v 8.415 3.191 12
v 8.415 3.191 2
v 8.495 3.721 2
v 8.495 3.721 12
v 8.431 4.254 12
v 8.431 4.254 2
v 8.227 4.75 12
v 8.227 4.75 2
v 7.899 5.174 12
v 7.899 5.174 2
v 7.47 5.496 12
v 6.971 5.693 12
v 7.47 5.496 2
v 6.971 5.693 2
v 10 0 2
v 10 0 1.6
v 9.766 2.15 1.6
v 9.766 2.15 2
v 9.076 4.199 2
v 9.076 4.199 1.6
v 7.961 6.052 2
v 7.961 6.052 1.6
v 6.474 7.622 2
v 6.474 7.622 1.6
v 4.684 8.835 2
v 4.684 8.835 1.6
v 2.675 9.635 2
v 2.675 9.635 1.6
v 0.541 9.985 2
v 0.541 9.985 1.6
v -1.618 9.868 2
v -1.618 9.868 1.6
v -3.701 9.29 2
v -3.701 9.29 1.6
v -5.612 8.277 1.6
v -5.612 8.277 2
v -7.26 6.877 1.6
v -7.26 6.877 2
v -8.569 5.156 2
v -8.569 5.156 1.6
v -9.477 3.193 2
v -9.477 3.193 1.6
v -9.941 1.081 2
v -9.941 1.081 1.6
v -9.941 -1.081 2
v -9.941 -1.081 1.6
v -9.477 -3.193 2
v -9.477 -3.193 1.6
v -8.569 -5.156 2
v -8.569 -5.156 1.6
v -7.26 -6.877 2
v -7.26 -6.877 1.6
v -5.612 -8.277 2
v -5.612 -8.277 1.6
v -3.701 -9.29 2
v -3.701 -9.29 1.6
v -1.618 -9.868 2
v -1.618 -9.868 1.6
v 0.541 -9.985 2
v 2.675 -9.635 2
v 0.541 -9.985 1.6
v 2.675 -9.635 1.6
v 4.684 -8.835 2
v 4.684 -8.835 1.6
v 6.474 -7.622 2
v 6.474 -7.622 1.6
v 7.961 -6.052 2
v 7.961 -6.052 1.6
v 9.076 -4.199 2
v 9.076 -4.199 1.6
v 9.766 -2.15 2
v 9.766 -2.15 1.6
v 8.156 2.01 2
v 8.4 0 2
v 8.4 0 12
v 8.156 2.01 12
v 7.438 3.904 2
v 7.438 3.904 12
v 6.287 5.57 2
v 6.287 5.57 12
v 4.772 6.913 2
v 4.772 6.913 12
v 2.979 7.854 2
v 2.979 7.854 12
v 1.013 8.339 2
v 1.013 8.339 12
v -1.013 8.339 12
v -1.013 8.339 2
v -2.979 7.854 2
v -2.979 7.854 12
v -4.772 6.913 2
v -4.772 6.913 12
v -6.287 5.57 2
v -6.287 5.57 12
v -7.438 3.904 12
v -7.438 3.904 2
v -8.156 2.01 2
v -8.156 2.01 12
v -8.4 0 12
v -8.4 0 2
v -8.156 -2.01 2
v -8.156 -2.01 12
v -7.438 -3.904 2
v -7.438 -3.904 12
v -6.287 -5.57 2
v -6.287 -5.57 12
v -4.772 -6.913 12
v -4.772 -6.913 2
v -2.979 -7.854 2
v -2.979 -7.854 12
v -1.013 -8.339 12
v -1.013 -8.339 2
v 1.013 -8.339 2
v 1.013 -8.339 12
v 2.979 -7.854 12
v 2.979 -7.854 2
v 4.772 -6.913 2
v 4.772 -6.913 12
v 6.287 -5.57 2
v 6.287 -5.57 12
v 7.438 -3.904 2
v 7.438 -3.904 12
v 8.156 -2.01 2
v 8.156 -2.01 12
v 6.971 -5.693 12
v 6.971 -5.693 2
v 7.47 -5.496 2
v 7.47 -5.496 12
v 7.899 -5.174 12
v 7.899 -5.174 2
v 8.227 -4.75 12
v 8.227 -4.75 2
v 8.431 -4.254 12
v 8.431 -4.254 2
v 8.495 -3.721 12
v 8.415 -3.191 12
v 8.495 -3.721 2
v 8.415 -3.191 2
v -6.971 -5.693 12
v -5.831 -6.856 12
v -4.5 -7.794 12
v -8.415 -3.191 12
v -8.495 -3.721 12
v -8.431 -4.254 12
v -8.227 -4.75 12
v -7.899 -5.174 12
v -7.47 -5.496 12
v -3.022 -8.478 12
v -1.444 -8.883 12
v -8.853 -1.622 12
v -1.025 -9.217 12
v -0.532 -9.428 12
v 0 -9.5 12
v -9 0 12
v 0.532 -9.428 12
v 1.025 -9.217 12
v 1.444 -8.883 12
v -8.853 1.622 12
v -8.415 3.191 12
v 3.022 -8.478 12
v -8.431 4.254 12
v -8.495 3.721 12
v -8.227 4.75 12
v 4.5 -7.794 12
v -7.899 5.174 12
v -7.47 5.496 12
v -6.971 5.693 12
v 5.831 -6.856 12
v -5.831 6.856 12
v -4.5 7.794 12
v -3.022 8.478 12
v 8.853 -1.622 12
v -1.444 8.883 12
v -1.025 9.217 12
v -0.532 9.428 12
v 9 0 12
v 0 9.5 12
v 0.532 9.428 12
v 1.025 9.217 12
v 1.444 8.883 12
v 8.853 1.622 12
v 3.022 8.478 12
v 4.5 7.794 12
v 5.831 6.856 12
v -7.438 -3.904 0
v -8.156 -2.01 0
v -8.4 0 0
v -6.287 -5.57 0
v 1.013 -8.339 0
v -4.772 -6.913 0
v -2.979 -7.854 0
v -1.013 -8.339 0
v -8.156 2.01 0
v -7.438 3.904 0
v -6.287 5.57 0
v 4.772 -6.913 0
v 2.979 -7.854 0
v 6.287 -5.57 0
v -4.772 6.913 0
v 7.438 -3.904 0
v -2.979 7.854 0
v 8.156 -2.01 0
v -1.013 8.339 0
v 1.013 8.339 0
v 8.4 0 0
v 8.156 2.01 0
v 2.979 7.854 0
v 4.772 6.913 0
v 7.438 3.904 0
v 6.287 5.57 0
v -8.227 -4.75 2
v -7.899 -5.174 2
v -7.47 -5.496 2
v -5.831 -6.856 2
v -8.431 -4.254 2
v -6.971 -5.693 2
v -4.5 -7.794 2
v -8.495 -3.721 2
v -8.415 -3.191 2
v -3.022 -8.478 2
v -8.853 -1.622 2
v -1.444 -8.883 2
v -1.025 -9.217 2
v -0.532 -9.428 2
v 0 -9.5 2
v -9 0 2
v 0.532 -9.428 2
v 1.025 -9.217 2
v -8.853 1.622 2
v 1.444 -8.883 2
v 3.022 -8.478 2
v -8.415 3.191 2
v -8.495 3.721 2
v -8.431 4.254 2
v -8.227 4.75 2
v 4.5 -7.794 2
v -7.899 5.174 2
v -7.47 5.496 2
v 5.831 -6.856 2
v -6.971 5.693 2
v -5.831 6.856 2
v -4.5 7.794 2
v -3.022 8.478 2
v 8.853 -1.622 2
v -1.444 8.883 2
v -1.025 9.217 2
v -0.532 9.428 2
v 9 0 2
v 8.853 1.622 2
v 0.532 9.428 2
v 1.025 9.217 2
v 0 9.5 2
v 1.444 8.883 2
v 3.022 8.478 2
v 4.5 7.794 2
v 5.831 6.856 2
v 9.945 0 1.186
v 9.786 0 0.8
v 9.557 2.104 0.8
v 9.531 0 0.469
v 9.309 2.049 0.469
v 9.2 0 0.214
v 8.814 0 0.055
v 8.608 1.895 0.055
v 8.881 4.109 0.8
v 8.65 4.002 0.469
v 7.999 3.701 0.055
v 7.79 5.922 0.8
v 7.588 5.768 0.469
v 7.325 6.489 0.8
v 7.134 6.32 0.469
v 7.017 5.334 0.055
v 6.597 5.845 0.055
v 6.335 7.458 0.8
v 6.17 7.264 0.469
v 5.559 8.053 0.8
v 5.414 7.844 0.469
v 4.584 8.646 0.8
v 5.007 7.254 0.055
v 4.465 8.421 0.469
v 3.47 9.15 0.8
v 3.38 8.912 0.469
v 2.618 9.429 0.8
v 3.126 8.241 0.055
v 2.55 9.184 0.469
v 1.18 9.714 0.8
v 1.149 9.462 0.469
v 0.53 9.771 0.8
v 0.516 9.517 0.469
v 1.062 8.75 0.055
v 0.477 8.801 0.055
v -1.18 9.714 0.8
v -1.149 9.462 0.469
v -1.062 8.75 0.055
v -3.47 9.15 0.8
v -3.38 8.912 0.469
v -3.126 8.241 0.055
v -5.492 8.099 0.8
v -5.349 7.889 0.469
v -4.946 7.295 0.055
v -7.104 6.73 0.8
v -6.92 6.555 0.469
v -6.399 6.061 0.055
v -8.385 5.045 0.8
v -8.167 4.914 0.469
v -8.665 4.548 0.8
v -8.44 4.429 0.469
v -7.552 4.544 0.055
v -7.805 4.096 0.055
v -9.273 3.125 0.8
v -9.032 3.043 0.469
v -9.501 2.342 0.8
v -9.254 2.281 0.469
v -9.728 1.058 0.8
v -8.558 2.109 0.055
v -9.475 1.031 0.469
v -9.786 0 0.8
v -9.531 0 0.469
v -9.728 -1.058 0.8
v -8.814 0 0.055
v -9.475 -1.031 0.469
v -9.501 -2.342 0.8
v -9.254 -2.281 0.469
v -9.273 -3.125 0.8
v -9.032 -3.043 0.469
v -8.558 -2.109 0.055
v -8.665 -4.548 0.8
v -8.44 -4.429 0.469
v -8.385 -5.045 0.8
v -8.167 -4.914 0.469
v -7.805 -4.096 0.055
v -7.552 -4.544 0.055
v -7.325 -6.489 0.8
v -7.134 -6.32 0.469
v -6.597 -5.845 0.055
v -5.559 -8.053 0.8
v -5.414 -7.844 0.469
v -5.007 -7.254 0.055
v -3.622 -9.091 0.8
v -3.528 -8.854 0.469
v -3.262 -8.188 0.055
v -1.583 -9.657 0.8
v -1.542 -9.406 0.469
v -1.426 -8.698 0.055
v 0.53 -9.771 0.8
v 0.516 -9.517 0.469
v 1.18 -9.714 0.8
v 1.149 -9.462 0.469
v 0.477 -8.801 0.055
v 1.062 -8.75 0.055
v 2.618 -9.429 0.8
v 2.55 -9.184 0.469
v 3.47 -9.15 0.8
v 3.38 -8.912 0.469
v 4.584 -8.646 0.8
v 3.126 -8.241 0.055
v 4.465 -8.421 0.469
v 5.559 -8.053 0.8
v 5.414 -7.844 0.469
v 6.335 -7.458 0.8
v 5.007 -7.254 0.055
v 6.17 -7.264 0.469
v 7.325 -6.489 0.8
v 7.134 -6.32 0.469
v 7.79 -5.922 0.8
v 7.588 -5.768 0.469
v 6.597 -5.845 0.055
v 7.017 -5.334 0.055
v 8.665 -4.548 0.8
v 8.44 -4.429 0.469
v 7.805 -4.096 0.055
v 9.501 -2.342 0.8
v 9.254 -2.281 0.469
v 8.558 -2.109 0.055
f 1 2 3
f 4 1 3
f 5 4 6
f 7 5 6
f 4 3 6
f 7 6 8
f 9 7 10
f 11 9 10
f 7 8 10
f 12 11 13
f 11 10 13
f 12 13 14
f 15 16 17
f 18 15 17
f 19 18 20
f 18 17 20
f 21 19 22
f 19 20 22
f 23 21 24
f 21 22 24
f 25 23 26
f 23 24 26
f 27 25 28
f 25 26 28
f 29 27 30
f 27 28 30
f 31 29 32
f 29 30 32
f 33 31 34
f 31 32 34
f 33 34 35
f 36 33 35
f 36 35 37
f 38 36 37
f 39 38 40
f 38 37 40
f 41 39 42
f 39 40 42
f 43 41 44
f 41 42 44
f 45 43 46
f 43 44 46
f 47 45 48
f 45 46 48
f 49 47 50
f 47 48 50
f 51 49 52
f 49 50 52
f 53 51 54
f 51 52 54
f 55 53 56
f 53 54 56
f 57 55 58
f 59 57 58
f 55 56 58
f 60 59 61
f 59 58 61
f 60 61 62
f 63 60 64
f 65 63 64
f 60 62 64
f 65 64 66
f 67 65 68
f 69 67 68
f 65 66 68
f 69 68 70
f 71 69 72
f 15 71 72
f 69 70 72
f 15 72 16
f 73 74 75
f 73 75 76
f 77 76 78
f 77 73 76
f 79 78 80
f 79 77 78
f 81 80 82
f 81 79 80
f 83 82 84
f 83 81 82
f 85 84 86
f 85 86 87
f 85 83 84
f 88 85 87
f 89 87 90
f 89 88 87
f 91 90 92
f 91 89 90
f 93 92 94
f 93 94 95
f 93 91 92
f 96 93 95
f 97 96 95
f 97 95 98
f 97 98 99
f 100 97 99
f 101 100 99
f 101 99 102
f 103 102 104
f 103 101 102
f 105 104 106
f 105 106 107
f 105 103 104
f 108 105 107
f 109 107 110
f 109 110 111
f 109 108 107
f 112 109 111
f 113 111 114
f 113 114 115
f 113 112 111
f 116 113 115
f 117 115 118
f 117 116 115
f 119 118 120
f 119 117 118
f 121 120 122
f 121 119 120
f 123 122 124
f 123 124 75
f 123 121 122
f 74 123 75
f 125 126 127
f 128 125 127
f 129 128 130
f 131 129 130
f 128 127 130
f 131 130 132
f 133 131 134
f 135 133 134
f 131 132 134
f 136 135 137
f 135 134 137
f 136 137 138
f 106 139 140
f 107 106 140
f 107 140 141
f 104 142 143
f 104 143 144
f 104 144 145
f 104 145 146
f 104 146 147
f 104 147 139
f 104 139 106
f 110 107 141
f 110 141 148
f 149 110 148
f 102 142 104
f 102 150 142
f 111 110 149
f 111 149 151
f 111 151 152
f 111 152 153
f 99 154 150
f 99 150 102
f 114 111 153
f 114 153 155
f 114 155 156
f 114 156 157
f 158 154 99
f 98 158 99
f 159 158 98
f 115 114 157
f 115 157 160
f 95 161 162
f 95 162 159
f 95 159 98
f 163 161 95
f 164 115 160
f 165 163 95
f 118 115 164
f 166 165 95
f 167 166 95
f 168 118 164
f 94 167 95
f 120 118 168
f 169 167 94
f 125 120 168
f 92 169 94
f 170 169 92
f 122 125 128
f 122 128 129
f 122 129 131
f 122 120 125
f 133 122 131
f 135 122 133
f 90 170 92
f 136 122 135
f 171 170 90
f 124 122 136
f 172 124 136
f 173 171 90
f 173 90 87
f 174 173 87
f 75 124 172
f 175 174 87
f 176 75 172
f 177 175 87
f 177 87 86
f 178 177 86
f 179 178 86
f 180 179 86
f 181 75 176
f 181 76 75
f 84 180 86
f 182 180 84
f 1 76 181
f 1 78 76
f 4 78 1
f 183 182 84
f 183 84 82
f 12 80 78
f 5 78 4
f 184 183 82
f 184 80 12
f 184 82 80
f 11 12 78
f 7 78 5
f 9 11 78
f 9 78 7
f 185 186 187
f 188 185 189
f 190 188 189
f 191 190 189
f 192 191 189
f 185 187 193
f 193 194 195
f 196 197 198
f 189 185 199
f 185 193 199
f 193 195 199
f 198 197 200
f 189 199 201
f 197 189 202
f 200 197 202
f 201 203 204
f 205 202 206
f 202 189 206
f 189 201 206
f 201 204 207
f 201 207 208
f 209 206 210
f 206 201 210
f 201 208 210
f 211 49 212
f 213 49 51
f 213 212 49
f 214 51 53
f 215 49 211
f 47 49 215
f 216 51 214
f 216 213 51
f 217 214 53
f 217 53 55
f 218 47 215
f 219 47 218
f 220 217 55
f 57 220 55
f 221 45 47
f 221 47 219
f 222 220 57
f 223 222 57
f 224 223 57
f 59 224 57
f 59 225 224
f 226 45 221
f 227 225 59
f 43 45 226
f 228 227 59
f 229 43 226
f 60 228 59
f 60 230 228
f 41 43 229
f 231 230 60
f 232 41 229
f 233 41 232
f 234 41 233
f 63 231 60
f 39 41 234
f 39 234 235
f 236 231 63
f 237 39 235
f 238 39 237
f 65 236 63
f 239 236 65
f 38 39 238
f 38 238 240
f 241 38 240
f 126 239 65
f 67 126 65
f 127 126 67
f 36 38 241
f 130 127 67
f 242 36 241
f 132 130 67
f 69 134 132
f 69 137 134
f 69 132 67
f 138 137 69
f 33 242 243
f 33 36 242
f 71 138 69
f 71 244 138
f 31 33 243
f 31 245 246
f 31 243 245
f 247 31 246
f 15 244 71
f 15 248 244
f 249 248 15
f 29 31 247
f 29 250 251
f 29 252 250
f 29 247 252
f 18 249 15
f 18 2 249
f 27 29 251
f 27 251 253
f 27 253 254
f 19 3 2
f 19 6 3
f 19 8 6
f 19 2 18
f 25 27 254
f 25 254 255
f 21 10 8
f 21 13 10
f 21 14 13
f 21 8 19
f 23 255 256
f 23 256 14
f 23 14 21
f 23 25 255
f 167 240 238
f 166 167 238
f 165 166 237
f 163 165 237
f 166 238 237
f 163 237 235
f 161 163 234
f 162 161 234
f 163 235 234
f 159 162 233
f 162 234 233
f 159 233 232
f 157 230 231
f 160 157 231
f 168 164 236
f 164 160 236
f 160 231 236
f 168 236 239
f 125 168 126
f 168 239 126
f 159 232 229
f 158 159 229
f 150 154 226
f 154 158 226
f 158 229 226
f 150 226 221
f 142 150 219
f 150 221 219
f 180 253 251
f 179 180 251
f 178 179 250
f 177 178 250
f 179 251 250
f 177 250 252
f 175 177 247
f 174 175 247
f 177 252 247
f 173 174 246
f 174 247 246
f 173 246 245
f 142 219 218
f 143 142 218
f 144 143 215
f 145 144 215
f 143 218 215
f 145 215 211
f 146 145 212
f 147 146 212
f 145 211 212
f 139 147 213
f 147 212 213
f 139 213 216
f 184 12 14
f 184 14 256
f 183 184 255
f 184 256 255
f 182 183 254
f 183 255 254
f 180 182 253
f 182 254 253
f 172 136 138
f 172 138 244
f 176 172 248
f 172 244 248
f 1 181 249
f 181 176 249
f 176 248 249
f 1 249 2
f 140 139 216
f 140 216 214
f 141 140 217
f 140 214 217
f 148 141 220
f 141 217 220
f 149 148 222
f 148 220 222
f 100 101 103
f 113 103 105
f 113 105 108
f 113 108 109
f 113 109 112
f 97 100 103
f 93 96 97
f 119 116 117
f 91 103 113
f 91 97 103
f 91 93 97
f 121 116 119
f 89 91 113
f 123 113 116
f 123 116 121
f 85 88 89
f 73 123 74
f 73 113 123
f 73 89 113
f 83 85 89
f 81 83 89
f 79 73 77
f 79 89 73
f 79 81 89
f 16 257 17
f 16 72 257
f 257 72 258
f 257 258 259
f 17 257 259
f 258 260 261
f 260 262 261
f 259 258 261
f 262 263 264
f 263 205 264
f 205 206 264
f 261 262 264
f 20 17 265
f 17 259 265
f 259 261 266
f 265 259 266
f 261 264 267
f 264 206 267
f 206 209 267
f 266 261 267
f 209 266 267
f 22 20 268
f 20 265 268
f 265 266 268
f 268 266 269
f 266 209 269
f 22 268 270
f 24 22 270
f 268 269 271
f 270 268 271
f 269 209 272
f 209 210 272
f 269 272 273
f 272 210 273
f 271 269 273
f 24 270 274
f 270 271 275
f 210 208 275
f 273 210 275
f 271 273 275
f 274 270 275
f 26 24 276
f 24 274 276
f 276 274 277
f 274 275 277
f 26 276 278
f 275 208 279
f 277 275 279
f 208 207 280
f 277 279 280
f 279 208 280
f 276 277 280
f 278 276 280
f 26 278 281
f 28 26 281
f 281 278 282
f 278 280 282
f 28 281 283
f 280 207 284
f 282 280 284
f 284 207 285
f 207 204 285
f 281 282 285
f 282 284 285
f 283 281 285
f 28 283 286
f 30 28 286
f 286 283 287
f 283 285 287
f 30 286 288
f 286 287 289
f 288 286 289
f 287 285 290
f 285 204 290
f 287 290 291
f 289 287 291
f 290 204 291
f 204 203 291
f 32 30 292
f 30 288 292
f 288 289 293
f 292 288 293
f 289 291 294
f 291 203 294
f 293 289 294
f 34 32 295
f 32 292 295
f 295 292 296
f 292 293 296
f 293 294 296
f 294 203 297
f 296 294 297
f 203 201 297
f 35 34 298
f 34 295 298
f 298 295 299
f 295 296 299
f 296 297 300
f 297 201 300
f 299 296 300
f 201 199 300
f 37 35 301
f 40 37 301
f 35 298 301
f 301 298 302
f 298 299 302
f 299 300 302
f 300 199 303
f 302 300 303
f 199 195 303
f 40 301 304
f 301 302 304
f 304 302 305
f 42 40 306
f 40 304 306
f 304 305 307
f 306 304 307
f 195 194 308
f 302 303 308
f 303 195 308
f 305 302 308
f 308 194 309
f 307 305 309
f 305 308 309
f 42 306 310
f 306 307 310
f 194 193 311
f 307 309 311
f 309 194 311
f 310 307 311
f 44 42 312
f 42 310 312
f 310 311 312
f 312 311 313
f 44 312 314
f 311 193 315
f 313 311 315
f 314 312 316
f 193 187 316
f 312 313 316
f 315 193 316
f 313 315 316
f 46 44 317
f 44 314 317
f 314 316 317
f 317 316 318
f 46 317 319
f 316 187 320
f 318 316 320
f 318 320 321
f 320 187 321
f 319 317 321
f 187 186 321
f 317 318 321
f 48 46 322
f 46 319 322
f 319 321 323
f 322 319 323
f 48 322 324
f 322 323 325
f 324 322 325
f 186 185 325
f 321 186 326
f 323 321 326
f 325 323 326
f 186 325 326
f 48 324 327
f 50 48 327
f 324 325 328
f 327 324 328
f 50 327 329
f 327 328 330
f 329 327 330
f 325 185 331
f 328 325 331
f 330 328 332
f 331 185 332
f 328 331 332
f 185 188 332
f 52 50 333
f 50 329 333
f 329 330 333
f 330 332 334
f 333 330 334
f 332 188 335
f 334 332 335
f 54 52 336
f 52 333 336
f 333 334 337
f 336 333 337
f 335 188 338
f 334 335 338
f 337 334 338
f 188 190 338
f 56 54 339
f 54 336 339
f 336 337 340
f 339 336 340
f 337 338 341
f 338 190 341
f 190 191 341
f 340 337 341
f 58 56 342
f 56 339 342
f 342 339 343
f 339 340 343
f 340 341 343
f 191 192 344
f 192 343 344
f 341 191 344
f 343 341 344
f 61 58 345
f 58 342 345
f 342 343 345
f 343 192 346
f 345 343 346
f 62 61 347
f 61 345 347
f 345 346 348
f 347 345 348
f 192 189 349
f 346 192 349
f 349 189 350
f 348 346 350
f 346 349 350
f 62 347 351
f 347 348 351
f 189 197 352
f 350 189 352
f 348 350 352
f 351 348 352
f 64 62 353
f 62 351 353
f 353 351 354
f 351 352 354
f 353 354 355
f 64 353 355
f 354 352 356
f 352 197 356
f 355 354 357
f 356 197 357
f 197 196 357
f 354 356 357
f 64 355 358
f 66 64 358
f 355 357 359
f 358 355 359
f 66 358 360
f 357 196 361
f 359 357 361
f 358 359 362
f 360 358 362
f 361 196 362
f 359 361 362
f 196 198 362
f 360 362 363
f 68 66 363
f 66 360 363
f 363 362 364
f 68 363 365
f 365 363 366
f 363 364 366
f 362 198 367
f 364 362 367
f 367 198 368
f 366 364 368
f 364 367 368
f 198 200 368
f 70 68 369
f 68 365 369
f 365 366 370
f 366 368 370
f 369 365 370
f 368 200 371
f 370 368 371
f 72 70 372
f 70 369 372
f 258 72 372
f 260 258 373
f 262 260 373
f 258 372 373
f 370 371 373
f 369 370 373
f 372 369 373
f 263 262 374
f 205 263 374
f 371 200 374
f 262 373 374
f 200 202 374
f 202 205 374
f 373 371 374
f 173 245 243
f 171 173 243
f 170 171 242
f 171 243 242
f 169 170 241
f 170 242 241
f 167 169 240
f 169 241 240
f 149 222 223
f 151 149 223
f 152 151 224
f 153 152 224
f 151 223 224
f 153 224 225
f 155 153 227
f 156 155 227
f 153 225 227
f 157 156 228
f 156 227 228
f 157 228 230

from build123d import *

# Parameters (mm, degrees)
F0_R            = 10
F1_DEPTH        = 2
F2_R            = 1.6
F4_R            = 9
F4_R_2          = 8.4
F5_DEPTH        = 10
F7_DEPTH        = 10
F7_COPIES_COUNT = 6


# Not quite as in the source:
# - a pattern or mirror of a feature is missing from the dataset's text; its kind, count and spacing are read off the source's solid


with BuildPart() as f1:
    # F0 (on Top) → F1 (new body)
    with BuildSketch(Plane.XY):
        Circle(F0_R)
    extrude(amount=F1_DEPTH)

    # F2
    f2_edges = [f1.edges().sort_by_distance(p)[0] for p in [
        (-10, 0, 0),
    ]]
    fillet(f2_edges, radius=F2_R)

    # F4 (on face) → F5 (join)
    with BuildSketch(Plane.XY.offset(2)):
        Circle(F4_R)
        Circle(F4_R_2, mode=Mode.SUBTRACT)
    extrude(amount=F5_DEPTH)

    # F6 (on face) → F7 (join, through all)
    with BuildSketch(Plane.XY.offset(2)):
        with BuildLine():
            ThreePointArc((-1.4444337606, 8.8833333333), (0, 9), (1.4444337606, 8.8833333333))
            ThreePointArc((1.4444337606, 8.8833333333), (0, 9.5), (-1.4444337606, 8.8833333333))
        make_face()
    f7 = extrude(amount=F7_DEPTH)

    # F7_copies: F7 ×6 about axis
    f7_copies_axis = Axis((0, 0, 0), (0, 0, 1))
    for i in range(1, F7_COPIES_COUNT):
        add(f7.rotate(f7_copies_axis, i * 360 / F7_COPIES_COUNT))


solid = f1.part
